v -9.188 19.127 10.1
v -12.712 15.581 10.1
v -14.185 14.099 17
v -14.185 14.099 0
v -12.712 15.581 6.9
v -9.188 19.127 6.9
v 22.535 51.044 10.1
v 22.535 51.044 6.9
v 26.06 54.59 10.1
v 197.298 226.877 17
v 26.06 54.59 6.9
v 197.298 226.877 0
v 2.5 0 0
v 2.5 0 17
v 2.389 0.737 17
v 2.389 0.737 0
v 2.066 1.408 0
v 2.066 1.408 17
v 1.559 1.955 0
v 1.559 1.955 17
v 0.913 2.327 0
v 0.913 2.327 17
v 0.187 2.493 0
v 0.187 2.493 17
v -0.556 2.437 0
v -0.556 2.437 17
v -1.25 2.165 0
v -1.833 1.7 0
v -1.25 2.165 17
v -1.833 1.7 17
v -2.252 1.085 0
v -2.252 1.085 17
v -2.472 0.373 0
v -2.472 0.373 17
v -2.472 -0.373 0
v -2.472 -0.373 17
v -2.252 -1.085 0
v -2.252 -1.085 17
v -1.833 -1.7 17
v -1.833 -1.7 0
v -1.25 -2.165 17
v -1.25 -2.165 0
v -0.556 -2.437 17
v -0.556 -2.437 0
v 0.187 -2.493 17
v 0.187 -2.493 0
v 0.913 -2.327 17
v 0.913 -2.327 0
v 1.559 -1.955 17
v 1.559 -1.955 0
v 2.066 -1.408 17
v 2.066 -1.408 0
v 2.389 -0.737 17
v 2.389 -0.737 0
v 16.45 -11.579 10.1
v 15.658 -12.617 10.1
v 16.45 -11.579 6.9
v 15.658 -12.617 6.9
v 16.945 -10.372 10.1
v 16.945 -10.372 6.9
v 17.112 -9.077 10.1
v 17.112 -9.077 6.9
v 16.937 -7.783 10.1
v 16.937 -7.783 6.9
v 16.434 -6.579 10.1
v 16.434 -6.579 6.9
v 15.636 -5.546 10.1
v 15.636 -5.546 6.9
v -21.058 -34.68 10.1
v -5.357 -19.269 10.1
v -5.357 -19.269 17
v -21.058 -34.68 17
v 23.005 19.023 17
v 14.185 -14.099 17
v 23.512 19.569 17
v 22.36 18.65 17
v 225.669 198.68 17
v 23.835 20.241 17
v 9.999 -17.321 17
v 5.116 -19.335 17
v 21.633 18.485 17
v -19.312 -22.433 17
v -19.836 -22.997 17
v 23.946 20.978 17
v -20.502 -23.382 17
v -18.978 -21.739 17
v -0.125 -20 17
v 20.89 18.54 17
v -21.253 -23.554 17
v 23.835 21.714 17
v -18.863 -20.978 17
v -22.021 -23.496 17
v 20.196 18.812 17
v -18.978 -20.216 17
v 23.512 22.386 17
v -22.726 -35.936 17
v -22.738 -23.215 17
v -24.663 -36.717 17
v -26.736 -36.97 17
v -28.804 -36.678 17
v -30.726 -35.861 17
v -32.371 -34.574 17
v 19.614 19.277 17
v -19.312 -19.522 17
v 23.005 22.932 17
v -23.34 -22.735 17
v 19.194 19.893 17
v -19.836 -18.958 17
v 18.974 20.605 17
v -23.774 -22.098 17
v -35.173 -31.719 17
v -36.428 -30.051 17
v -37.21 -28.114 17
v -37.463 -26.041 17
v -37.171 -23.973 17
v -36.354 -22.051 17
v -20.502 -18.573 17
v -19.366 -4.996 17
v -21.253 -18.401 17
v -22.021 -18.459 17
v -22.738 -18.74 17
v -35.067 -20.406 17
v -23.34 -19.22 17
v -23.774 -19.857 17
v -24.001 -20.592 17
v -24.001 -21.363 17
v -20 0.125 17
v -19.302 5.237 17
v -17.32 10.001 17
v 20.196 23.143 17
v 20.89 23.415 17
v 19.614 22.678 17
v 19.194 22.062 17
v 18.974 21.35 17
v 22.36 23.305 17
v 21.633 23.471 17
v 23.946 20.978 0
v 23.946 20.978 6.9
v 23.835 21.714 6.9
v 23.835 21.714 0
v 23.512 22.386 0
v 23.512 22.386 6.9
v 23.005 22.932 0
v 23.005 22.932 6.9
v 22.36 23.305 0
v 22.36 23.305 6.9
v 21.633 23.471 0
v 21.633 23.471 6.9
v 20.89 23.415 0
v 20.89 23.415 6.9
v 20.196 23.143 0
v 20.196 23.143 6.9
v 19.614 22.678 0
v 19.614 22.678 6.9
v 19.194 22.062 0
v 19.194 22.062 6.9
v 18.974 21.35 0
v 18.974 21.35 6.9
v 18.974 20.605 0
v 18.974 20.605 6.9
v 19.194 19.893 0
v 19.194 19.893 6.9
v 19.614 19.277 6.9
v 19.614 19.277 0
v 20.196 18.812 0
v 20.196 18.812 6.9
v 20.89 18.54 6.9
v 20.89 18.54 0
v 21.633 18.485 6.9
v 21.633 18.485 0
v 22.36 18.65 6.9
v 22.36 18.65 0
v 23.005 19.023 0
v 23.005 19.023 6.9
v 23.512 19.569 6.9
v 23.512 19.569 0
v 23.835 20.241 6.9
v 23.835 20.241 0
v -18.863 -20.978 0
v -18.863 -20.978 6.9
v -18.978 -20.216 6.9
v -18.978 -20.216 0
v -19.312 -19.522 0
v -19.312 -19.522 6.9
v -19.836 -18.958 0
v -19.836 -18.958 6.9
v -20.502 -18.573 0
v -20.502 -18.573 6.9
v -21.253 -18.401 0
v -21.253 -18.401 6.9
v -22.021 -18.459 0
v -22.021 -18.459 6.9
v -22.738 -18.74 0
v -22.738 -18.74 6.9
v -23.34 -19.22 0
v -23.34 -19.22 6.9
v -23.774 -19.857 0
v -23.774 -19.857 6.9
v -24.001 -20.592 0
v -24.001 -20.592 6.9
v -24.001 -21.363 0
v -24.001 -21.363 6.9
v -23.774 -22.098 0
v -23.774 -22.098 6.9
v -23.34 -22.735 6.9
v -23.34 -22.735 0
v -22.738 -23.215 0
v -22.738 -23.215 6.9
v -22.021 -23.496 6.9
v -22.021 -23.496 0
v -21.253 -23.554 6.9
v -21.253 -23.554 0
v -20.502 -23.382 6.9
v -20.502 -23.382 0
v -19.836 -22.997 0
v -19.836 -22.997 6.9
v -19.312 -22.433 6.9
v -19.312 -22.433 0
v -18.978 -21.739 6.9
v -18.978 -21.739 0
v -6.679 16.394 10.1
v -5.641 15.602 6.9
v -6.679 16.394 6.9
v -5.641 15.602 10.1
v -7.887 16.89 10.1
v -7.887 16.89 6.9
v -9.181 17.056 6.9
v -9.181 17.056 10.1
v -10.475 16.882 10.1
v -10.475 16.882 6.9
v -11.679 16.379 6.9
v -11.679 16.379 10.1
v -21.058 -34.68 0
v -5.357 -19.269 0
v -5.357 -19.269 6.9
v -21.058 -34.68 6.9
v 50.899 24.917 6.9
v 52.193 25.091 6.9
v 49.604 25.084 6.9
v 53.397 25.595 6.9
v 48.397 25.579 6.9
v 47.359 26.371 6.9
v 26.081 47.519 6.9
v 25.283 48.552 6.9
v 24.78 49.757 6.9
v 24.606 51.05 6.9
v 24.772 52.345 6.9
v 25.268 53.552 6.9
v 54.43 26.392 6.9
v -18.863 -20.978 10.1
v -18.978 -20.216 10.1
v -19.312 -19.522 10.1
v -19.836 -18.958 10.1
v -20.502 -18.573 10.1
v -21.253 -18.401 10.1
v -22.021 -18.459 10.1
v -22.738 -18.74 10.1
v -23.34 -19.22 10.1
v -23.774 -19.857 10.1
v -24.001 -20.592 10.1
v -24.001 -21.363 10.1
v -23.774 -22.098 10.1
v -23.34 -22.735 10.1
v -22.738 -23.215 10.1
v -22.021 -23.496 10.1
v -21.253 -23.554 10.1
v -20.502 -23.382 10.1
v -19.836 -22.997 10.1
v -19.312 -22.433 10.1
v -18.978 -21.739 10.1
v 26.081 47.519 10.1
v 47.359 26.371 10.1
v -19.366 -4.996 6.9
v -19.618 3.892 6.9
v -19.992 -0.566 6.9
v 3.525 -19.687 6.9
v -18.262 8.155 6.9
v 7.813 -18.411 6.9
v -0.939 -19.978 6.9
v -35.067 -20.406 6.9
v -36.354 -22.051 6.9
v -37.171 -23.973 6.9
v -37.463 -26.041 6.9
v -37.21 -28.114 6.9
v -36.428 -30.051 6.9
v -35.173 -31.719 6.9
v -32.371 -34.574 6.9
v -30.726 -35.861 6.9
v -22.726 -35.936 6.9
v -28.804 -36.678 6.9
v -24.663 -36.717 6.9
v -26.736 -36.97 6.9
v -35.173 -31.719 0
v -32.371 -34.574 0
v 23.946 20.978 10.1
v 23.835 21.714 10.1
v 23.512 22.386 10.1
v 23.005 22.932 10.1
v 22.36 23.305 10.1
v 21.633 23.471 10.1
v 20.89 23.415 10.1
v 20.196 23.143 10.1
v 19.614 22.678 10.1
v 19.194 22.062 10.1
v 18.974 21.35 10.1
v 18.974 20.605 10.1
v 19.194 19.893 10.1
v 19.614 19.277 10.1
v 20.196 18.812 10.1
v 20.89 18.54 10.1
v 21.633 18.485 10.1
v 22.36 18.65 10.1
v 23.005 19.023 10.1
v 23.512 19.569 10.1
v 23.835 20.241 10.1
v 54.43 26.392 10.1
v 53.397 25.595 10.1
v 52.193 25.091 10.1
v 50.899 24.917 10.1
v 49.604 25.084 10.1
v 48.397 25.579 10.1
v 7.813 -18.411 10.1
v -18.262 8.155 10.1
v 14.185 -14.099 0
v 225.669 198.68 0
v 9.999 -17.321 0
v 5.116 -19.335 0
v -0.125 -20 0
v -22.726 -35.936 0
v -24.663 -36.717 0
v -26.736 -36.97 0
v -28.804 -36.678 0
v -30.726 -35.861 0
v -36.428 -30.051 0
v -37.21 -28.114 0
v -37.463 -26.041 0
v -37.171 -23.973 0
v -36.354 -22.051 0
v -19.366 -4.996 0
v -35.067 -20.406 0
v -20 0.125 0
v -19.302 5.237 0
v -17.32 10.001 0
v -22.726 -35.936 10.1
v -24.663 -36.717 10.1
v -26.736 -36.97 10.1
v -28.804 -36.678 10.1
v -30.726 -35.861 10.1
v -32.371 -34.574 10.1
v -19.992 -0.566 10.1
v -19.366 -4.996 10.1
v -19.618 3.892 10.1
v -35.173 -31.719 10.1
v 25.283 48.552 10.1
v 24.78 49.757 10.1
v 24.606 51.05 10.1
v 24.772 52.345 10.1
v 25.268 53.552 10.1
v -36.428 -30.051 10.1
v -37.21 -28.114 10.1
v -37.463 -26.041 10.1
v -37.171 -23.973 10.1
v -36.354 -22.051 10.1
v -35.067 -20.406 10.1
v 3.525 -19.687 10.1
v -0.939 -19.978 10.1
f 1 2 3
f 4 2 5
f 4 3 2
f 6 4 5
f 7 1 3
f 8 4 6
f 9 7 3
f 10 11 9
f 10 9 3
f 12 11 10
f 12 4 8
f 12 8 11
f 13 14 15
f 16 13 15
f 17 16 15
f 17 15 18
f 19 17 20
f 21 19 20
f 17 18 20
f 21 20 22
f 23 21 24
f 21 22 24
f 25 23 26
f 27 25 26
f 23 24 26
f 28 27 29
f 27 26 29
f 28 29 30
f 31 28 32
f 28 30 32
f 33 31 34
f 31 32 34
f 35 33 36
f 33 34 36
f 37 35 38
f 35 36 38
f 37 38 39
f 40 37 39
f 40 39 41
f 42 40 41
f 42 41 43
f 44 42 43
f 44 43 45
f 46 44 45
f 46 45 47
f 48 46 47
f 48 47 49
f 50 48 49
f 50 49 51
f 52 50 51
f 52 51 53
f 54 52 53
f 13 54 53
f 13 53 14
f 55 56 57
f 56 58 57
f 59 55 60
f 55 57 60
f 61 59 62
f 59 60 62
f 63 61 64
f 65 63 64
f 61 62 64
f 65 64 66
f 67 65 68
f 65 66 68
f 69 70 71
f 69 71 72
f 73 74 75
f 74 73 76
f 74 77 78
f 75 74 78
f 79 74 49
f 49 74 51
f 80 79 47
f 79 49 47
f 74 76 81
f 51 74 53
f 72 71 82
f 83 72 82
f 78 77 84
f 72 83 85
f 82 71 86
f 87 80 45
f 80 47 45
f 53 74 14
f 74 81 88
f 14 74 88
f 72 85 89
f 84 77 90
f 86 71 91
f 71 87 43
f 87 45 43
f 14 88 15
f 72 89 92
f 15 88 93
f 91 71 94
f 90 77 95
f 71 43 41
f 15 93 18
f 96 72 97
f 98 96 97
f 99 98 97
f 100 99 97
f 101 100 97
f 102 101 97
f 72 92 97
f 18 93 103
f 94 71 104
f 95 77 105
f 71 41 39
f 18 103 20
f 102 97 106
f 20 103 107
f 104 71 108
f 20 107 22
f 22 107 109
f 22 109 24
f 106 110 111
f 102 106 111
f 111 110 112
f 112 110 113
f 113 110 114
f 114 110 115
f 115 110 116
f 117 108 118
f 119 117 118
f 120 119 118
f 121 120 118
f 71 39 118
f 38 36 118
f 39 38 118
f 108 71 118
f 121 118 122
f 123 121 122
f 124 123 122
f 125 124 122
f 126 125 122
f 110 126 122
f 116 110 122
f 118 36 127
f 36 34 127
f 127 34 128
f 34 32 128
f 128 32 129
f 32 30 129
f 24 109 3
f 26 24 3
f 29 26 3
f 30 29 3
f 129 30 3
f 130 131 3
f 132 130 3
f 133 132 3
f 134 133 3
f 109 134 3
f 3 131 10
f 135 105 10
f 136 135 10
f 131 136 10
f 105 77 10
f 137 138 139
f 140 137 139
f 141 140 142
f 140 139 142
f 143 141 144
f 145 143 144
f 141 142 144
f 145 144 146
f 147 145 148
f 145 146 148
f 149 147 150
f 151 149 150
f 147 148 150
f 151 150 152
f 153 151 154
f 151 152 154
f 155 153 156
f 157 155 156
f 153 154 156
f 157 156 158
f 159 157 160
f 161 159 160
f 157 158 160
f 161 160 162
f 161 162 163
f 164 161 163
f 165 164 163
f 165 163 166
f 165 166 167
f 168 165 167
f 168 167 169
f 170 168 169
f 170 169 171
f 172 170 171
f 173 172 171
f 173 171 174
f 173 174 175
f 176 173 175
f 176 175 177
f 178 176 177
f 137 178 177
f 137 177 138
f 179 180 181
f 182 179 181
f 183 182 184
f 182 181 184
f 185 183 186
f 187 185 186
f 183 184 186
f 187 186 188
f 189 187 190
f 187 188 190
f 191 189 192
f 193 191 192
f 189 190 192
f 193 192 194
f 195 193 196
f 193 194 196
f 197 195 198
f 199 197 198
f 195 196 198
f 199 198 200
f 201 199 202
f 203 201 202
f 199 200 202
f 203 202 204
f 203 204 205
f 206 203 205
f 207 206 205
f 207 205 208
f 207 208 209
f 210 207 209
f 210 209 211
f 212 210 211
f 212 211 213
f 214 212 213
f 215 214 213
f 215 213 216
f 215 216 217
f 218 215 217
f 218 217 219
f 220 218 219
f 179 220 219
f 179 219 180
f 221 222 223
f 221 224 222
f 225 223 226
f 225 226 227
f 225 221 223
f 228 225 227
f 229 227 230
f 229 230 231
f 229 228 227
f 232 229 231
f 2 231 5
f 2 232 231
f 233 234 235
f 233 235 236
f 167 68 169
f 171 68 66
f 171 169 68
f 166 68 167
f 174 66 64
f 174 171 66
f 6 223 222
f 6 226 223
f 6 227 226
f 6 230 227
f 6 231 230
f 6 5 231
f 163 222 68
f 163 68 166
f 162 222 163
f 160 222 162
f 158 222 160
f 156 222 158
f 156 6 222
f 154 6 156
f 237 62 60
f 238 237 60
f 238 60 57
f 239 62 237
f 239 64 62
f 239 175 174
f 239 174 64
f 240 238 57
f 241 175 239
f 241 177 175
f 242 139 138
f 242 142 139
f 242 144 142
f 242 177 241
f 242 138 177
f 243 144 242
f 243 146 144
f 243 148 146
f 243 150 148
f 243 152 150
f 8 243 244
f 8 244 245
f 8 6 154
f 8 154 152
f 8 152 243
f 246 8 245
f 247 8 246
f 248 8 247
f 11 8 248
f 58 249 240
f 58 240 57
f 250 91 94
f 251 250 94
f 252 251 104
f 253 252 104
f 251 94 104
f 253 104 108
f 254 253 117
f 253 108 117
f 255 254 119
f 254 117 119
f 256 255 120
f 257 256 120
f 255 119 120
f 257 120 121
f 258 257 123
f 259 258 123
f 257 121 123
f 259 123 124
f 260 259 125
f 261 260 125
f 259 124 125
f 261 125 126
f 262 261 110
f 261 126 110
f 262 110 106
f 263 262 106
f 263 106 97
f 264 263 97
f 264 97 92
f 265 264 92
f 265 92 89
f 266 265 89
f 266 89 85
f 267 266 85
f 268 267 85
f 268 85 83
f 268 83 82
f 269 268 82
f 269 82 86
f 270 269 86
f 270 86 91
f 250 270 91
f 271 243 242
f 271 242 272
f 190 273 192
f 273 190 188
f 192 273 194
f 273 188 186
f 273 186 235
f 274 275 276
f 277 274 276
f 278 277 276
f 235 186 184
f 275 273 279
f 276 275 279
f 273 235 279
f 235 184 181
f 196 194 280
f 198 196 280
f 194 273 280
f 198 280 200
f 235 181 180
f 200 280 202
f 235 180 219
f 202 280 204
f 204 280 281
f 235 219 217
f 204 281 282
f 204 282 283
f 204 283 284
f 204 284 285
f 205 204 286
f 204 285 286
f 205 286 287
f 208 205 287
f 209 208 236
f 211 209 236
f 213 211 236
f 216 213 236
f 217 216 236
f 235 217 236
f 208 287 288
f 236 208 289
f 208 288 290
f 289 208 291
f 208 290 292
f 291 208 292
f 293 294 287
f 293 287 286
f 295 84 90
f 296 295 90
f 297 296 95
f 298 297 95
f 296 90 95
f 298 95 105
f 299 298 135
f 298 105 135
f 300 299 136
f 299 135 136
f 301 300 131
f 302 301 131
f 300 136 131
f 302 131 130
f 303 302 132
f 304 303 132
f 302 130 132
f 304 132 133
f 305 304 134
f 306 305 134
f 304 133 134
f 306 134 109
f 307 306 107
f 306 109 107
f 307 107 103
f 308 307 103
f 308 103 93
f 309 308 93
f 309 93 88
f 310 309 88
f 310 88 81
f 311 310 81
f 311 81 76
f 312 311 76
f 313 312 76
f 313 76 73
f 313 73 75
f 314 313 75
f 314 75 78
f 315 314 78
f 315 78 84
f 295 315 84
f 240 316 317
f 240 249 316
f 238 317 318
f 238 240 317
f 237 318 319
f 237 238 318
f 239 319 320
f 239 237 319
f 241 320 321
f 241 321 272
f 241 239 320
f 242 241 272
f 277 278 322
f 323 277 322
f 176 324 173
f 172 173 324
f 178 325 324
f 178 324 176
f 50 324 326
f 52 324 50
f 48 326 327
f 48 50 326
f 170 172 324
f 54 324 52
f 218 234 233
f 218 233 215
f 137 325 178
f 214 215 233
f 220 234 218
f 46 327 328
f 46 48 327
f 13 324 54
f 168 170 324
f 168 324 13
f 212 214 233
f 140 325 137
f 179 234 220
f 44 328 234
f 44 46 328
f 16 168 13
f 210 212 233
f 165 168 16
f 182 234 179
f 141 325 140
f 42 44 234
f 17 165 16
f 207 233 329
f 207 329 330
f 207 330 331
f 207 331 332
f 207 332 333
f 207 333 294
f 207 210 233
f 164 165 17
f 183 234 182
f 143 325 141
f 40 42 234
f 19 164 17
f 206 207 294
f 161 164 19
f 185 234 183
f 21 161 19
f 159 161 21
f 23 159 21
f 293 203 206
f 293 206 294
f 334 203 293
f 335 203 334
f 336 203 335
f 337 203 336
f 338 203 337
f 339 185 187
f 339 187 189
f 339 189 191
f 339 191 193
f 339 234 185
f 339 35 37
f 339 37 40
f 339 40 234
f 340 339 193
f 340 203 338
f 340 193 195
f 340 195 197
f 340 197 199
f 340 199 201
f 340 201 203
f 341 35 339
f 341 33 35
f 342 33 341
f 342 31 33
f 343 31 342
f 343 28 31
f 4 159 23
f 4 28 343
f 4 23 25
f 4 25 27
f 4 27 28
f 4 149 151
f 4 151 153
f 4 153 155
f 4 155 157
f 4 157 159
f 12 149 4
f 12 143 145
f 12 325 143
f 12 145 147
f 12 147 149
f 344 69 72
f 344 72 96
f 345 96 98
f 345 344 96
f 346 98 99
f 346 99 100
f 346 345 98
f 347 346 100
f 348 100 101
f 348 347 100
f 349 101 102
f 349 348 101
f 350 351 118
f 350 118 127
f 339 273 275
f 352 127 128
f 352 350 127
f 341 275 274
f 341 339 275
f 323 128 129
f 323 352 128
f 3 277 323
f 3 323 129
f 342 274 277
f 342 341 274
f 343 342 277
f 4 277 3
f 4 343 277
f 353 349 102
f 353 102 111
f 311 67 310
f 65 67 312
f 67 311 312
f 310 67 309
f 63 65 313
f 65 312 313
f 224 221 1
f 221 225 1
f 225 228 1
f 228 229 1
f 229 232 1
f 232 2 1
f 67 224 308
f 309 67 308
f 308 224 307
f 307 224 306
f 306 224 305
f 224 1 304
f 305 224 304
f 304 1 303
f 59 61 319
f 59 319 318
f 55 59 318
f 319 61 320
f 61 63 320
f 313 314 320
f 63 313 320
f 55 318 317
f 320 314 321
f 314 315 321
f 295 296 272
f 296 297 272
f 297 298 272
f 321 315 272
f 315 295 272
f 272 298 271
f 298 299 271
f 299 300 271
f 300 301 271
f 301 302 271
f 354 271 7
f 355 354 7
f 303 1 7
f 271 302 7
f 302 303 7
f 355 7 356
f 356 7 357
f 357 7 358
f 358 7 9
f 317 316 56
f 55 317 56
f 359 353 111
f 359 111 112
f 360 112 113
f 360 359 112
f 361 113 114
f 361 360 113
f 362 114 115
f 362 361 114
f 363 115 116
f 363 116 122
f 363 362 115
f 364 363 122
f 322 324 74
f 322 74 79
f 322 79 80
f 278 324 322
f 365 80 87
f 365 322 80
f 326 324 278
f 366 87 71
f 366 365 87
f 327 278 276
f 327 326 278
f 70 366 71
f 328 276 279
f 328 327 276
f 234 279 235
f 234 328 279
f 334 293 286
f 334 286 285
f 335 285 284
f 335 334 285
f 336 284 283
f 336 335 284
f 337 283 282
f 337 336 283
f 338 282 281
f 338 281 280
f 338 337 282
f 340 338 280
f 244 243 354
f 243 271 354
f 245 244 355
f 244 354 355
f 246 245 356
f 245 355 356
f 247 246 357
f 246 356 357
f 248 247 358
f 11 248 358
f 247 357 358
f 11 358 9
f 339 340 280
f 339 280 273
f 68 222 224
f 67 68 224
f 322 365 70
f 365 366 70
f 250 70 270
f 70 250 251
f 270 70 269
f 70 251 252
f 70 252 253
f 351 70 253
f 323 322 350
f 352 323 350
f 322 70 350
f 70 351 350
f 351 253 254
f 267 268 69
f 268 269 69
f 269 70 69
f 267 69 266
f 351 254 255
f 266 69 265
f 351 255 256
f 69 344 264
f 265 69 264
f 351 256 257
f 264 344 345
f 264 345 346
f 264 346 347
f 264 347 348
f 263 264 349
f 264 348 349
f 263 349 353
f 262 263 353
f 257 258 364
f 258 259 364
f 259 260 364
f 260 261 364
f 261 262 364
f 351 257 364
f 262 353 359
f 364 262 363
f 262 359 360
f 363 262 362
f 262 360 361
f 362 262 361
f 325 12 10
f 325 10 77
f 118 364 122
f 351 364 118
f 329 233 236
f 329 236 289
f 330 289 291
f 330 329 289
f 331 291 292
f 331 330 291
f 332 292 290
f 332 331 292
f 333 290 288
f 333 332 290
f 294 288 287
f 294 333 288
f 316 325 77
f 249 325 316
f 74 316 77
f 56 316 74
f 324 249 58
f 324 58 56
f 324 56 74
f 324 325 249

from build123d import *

# Parameters (mm, degrees)
EXTRUDE_1_DEPTH     = 17
SKETCH_2_R          = 2.5
CUT_EXTRUDE_1_DEPTH = 321.450895562
SKETCH_3_R          = 2.583506321
CUT_EXTRUDE_2_DEPTH = 321.450895562
SKETCH_4_W          = 3.2
SKETCH_4_H          = 25.526459387
SKETCH_4_H_2        = 4
CUT_EXTRUDE_3_DEPTH = 40
SKETCH_5_R          = 2.5
CUT_EXTRUDE_4_DEPTH = 321.450895562
SKETCH_7_W          = 3.2
SKETCH_7_H          = 45
CUT_EXTRUDE_5_DEPTH = 322.082013561
FILLET_1_R          = 5


with BuildPart() as part:
    # 草图1 → 凸台-拉伸1 (new body)
    with BuildSketch(Plane.XY):
        with BuildLine():
            Line((-14.185229692, 14.098909836), (14.185229692, -14.098909836))
            ThreePointArc((14.185229692, -14.098909836), (-14.098909836, -14.185229692), (-14.185229692, 14.098909836))
        make_face()
        Polygon((197.298417852, 226.877355223), (225.668877237, 198.67953555), (14.185229692, -14.098909836), (-14.185229692, 14.098909836), align=None)
        with BuildLine():
            Line((-19.366021875, -4.995717839), (-5.356592379, -19.269325834))
            Line((-5.356592379, -19.269325834), (-21.057561173, -34.67969828))
            ThreePointArc((-21.057561173, -34.67969828), (-26.736053935, -36.969906123), (-32.37077617, -34.57402688))
            Line((-32.37077617, -34.57402688), (-35.172662069, -31.719305281))
            ThreePointArc((-35.172662069, -31.719305281), (-37.462869912, -26.04081252), (-35.06699067, -20.406090285))
            Line((-35.06699067, -20.406090285), (-19.366021875, -4.995717839))
        make_face()
    extrude(amount=EXTRUDE_1_DEPTH)

    # 草图2 → 切除-拉伸1 (cut, through all)
    with BuildSketch(Plane.XY.offset(17)):
        Circle(SKETCH_2_R)
    extrude(amount=-CUT_EXTRUDE_1_DEPTH, mode=Mode.SUBTRACT)

    # 草图3 → 切除-拉伸2 (cut, through all)
    with BuildSketch(Plane.XY.offset(17)):
        with Locations((-21.446298181, -20.977518784)):
            Circle(SKETCH_3_R)
    extrude(amount=-CUT_EXTRUDE_2_DEPTH, mode=Mode.SUBTRACT)

    # 草图4 → 切除-拉伸3 (cut)
    with BuildSketch(Plane(origin=(-33.771719119, -33.146666081, 0), x_dir=(0, 0, 1), z_dir=(-0.7136803997395496, -0.7004714748136406, 0))):
        with Locations((8.5, -14.763229694)):
            Rectangle(SKETCH_4_W, SKETCH_4_H)
        with Locations((8.5, 14.763229694)):
            Rectangle(SKETCH_4_W, SKETCH_4_H)
        with Locations((8.5, 0)):
            Rectangle(SKETCH_4_W, SKETCH_4_H_2)
    extrude(amount=-CUT_EXTRUDE_3_DEPTH, mode=Mode.SUBTRACT)

    # 草图5 → 切除-拉伸4 (cut, through all)
    with BuildSketch(Plane.XY.offset(17)):
        with Locations((21.446298181, 20.977518784)):
            Circle(SKETCH_5_R)
    extrude(amount=-CUT_EXTRUDE_4_DEPTH, mode=Mode.SUBTRACT)

    # 草图7 → 切除-拉伸5 (cut, through all)
    with BuildSketch(Plane(origin=(-14.185229692, 14.098909836, 0), x_dir=(0, 0, 1), z_dir=(-0.7092614846225489, 0.7049454918155146, 0))):
        with Locations((8.5, 29.589308396)):
            Rectangle(SKETCH_7_W, SKETCH_7_H)
    extrude(amount=-CUT_EXTRUDE_5_DEPTH, mode=Mode.SUBTRACT)

    # 圆角1
    fillet_1_edges = [part.edges().sort_by_distance(p)[0] for p in [
        (50.905352818, 22.846030369, 8.5),
        (19.182805686, -9.070736439, 8.5),
        (-9.187653699, 19.127083234, 8.5),
        (22.534893433, 51.043850042, 8.5),
    ]]
    fillet(fillet_1_edges, radius=FILLET_1_R)


solid = part.part
